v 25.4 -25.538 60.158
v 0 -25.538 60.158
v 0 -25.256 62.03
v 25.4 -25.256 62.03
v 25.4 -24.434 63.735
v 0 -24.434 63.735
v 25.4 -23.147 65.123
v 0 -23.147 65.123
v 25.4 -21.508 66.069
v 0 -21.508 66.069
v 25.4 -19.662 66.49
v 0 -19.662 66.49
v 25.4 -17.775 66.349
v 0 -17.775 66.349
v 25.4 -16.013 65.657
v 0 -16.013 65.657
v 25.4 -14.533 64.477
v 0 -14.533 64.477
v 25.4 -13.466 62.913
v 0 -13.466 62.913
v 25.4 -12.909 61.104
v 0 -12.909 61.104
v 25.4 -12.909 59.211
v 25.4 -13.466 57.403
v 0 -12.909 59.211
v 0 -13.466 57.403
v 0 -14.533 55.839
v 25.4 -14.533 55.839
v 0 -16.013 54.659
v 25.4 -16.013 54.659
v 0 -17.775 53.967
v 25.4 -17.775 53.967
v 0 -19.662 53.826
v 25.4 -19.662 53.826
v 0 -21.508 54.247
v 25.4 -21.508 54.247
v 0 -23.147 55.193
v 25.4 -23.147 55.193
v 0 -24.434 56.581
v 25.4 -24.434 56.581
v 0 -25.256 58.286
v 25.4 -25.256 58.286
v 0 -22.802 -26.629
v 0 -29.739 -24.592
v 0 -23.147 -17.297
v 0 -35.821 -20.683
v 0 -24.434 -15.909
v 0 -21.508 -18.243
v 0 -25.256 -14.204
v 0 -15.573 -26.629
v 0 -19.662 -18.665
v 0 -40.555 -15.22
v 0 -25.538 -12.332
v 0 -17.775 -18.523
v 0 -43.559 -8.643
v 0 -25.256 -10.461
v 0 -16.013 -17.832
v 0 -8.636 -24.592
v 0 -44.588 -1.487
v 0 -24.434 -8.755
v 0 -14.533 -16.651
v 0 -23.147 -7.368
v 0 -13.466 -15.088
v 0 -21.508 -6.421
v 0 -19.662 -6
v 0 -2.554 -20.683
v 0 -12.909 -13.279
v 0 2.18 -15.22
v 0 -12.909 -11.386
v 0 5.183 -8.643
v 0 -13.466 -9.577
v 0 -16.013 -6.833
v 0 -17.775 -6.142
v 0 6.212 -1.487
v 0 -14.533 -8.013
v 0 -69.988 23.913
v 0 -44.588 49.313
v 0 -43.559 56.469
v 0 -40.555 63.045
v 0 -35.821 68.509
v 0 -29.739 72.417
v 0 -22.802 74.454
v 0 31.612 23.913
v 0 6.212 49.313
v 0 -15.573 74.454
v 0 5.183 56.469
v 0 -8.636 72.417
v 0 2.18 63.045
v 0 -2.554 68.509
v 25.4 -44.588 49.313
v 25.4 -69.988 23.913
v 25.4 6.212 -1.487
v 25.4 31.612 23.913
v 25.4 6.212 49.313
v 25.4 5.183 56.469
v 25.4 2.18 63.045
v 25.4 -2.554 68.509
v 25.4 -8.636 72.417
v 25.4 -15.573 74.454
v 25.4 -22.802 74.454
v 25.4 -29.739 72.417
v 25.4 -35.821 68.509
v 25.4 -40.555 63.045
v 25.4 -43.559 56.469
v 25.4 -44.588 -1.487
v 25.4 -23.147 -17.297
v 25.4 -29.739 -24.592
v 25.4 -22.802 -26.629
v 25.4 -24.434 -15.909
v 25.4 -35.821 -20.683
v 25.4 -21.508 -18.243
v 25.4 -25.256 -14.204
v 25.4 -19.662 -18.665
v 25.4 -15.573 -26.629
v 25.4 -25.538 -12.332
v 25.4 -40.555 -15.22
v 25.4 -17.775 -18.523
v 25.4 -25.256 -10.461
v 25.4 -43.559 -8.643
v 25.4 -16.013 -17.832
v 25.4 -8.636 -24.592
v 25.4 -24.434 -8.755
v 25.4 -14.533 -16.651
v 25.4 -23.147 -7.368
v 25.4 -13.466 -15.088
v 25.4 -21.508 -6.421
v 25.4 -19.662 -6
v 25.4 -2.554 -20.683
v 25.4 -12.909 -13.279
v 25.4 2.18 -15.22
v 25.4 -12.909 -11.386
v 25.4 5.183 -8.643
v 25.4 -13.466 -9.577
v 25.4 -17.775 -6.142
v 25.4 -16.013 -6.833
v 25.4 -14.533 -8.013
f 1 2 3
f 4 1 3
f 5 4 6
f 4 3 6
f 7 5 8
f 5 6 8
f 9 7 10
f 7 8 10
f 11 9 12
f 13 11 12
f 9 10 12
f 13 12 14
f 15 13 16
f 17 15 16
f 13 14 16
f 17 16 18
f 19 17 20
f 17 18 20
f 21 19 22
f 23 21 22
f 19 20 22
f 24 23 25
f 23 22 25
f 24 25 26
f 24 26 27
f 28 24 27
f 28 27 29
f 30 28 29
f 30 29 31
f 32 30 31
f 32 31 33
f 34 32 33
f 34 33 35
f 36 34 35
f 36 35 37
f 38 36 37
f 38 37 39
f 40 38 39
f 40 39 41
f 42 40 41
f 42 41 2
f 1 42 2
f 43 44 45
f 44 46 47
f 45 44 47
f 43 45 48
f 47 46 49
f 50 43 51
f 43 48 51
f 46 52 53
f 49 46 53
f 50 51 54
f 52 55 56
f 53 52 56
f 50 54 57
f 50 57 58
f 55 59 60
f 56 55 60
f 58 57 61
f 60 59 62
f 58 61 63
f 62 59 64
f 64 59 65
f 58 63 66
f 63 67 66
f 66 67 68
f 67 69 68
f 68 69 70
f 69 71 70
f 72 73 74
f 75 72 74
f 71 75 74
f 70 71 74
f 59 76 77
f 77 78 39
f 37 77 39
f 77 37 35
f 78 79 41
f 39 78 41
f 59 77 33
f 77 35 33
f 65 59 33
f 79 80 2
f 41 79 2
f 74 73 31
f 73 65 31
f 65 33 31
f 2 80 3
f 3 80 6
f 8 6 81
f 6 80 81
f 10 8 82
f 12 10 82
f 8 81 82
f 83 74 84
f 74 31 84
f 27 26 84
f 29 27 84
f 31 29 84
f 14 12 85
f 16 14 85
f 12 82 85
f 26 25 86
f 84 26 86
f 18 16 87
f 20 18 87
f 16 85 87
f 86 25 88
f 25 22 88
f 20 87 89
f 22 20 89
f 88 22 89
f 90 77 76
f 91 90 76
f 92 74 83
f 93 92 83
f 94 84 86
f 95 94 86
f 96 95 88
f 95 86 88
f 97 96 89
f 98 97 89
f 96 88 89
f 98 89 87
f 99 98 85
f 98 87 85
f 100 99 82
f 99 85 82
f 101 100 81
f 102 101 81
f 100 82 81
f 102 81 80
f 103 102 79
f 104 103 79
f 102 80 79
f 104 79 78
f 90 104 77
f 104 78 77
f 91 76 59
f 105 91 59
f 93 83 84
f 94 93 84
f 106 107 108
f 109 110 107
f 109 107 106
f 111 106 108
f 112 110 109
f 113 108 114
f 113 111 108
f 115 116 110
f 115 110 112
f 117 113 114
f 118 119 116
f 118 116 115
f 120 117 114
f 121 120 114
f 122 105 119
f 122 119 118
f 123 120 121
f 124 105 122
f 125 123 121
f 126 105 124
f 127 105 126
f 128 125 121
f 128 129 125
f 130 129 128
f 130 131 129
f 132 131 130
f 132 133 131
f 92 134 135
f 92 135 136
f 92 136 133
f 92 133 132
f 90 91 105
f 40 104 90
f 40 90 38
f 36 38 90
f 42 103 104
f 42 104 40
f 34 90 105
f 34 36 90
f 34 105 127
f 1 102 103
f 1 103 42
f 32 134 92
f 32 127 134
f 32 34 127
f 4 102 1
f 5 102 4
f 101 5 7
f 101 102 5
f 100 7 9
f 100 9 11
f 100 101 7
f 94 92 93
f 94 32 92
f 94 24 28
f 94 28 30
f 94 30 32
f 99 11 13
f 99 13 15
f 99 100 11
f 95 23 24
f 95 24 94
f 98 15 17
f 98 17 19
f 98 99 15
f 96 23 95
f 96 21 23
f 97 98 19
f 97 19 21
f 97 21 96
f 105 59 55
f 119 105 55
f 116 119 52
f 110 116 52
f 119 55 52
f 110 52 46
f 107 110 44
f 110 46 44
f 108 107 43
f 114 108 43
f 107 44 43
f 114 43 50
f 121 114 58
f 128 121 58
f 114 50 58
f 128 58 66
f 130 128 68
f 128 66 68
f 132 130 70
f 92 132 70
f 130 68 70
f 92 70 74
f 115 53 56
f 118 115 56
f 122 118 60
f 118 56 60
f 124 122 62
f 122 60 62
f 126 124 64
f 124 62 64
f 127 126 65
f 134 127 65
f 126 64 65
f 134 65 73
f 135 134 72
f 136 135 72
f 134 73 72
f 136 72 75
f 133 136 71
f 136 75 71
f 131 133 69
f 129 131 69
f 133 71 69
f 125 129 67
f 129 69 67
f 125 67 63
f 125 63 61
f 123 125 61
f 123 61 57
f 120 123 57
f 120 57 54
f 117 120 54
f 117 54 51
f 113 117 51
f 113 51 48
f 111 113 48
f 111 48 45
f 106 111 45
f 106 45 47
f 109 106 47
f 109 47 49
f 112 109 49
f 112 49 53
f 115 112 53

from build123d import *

# Parameters (mm, degrees)
F0_W     = 50.8
F0_H     = 50.8
F1_DEPTH = 25.4
F3_D     = 12.7


with BuildPart() as f1:
    # F0 (on Right) → F1 (new body)
    with BuildSketch(Plane.YZ):
        with BuildLine():
            ThreePointArc((6.2123674129, 49.3127632231), (-19.1876325871, 74.7127632231), (-44.5876325871, 49.3127632231))
            Line((-44.5876325871, 49.3127632231), (6.2123674129, 49.3127632231))
        make_face()
        with Locations((-19.1876325871, 23.9127632231)):
            Rectangle(F0_W, F0_H)
        Polygon((-44.5876325871, -1.4872367769), (-44.5876325871, 49.3127632231), (-69.9876325871, 23.9127632231), align=None)
        Polygon((31.6123674129, 23.9127632231), (6.2123674129, 49.3127632231), (6.2123674129, -1.4872367769), align=None)
        with BuildLine():
            Line((6.2123674129, -1.4872367769), (-44.5876325871, -1.4872367769))
            ThreePointArc((-44.5876325871, -1.4872367769), (-19.1876325871, -26.8872367769), (6.2123674129, -1.4872367769))
        make_face()
    extrude(amount=F1_DEPTH)

    # F3 (through all)
    with Locations(Plane.YZ.offset(25.4)):
        with Locations((-19.1876325871, 60.1578950882), (-19.1876325871, -12.3323686421)):
            Hole(F3_D / 2)


solid = f1.part
